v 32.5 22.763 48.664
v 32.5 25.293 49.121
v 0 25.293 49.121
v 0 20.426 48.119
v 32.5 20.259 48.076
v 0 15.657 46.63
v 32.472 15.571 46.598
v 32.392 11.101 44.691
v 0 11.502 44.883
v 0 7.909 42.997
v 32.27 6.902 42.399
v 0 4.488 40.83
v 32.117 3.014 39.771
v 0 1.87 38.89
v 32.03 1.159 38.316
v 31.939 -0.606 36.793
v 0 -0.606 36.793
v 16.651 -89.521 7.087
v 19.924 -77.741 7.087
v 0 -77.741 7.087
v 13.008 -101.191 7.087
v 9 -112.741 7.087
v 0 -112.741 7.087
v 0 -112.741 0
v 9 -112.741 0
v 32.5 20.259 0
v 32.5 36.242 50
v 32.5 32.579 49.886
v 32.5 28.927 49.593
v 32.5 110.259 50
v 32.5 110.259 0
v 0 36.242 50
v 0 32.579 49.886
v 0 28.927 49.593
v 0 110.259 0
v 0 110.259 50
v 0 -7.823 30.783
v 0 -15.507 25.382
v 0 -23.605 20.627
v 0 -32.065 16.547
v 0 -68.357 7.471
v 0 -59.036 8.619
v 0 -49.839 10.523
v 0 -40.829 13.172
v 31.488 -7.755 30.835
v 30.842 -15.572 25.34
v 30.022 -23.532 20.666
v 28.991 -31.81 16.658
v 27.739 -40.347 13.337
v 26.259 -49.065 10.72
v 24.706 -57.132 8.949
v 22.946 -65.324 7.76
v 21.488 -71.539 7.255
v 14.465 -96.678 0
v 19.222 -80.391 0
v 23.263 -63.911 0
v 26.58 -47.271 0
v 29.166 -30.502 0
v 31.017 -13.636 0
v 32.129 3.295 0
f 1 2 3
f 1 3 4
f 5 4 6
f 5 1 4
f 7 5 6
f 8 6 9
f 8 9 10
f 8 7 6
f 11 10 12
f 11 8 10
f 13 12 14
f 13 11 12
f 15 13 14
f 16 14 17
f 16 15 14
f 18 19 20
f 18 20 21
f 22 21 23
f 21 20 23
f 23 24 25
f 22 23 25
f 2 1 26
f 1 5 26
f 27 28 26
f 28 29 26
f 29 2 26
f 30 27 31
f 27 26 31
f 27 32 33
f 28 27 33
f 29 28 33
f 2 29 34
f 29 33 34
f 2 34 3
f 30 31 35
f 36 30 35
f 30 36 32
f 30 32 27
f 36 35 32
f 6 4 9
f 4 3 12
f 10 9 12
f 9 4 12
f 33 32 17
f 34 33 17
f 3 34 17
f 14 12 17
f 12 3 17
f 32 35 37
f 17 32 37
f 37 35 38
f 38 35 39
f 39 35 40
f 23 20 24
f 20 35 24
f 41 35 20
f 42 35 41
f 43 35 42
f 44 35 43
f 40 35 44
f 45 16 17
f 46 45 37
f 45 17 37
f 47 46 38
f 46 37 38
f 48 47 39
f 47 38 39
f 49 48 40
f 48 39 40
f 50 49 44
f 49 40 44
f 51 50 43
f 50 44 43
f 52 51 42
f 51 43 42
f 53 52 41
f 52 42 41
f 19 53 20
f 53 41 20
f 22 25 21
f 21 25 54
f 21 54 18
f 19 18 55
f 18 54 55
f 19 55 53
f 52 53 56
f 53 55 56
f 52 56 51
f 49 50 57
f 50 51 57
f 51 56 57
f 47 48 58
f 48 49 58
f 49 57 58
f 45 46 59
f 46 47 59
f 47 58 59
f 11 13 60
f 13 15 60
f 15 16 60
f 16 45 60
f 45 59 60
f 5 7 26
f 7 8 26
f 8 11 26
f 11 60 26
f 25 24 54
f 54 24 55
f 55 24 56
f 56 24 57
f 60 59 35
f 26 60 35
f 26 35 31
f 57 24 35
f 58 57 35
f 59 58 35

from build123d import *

# Parameters (mm, degrees)
F1_DEPTH = 50
F3_DEPTH = 32.5
F4_R     = 50


with BuildPart() as f1:
    # F0 (on Top) → F1 (new body)
    with BuildSketch(Plane.XY):
        with BuildLine():
            Line((32.5, 110.258812), (0, 110.258812))
            Line((0, 110.258812), (0, -112.741188))
            Line((0, -112.741188), (9, -112.741188))
            ThreePointArc((9, -112.741188), (26.579848, -47.271274), (32.5, 20.258812))
            Line((32.5, 20.258812), (32.5, 110.258812))
        make_face()
    extrude(amount=F1_DEPTH)

    # F2 (on face) → F3 (cut)
    with BuildSketch(Plane(origin=(0, 0, 0), x_dir=(0, -1, 0), z_dir=(-1, 0, 0))):
        with BuildLine():
            Line((-37.258812, 50), (-36.241843, 50))
            ThreePointArc((-36.241843, 50), (-36.750328, 50.001724), (-37.258812, 50))
        make_face()
        with BuildLine():
            Line((112.741188, 50), (-12.258812, 50))
            Line((-12.258812, 50), (-36.241843, 50))
            ThreePointArc((-36.241843, 50), (-20.898034, 48.307281), (-6.225791, 43.509042))
            ThreePointArc((-6.225791, 43.509042), (31.978225, 16.584949), (77.741188, 7.087324))
            Line((77.741188, 7.087324), (112.741188, 7.087324))
            Line((112.741188, 7.087324), (112.741188, 50))
        make_face()
    extrude(amount=-F3_DEPTH, mode=Mode.SUBTRACT)

    # F4
    f4_edges = [f1.edges().sort_by_distance(p)[0] for p in [
        (16.12311, 6.225791, 43.509042),
    ]]
    fillet(f4_edges, radius=F4_R)


solid = f1.part
